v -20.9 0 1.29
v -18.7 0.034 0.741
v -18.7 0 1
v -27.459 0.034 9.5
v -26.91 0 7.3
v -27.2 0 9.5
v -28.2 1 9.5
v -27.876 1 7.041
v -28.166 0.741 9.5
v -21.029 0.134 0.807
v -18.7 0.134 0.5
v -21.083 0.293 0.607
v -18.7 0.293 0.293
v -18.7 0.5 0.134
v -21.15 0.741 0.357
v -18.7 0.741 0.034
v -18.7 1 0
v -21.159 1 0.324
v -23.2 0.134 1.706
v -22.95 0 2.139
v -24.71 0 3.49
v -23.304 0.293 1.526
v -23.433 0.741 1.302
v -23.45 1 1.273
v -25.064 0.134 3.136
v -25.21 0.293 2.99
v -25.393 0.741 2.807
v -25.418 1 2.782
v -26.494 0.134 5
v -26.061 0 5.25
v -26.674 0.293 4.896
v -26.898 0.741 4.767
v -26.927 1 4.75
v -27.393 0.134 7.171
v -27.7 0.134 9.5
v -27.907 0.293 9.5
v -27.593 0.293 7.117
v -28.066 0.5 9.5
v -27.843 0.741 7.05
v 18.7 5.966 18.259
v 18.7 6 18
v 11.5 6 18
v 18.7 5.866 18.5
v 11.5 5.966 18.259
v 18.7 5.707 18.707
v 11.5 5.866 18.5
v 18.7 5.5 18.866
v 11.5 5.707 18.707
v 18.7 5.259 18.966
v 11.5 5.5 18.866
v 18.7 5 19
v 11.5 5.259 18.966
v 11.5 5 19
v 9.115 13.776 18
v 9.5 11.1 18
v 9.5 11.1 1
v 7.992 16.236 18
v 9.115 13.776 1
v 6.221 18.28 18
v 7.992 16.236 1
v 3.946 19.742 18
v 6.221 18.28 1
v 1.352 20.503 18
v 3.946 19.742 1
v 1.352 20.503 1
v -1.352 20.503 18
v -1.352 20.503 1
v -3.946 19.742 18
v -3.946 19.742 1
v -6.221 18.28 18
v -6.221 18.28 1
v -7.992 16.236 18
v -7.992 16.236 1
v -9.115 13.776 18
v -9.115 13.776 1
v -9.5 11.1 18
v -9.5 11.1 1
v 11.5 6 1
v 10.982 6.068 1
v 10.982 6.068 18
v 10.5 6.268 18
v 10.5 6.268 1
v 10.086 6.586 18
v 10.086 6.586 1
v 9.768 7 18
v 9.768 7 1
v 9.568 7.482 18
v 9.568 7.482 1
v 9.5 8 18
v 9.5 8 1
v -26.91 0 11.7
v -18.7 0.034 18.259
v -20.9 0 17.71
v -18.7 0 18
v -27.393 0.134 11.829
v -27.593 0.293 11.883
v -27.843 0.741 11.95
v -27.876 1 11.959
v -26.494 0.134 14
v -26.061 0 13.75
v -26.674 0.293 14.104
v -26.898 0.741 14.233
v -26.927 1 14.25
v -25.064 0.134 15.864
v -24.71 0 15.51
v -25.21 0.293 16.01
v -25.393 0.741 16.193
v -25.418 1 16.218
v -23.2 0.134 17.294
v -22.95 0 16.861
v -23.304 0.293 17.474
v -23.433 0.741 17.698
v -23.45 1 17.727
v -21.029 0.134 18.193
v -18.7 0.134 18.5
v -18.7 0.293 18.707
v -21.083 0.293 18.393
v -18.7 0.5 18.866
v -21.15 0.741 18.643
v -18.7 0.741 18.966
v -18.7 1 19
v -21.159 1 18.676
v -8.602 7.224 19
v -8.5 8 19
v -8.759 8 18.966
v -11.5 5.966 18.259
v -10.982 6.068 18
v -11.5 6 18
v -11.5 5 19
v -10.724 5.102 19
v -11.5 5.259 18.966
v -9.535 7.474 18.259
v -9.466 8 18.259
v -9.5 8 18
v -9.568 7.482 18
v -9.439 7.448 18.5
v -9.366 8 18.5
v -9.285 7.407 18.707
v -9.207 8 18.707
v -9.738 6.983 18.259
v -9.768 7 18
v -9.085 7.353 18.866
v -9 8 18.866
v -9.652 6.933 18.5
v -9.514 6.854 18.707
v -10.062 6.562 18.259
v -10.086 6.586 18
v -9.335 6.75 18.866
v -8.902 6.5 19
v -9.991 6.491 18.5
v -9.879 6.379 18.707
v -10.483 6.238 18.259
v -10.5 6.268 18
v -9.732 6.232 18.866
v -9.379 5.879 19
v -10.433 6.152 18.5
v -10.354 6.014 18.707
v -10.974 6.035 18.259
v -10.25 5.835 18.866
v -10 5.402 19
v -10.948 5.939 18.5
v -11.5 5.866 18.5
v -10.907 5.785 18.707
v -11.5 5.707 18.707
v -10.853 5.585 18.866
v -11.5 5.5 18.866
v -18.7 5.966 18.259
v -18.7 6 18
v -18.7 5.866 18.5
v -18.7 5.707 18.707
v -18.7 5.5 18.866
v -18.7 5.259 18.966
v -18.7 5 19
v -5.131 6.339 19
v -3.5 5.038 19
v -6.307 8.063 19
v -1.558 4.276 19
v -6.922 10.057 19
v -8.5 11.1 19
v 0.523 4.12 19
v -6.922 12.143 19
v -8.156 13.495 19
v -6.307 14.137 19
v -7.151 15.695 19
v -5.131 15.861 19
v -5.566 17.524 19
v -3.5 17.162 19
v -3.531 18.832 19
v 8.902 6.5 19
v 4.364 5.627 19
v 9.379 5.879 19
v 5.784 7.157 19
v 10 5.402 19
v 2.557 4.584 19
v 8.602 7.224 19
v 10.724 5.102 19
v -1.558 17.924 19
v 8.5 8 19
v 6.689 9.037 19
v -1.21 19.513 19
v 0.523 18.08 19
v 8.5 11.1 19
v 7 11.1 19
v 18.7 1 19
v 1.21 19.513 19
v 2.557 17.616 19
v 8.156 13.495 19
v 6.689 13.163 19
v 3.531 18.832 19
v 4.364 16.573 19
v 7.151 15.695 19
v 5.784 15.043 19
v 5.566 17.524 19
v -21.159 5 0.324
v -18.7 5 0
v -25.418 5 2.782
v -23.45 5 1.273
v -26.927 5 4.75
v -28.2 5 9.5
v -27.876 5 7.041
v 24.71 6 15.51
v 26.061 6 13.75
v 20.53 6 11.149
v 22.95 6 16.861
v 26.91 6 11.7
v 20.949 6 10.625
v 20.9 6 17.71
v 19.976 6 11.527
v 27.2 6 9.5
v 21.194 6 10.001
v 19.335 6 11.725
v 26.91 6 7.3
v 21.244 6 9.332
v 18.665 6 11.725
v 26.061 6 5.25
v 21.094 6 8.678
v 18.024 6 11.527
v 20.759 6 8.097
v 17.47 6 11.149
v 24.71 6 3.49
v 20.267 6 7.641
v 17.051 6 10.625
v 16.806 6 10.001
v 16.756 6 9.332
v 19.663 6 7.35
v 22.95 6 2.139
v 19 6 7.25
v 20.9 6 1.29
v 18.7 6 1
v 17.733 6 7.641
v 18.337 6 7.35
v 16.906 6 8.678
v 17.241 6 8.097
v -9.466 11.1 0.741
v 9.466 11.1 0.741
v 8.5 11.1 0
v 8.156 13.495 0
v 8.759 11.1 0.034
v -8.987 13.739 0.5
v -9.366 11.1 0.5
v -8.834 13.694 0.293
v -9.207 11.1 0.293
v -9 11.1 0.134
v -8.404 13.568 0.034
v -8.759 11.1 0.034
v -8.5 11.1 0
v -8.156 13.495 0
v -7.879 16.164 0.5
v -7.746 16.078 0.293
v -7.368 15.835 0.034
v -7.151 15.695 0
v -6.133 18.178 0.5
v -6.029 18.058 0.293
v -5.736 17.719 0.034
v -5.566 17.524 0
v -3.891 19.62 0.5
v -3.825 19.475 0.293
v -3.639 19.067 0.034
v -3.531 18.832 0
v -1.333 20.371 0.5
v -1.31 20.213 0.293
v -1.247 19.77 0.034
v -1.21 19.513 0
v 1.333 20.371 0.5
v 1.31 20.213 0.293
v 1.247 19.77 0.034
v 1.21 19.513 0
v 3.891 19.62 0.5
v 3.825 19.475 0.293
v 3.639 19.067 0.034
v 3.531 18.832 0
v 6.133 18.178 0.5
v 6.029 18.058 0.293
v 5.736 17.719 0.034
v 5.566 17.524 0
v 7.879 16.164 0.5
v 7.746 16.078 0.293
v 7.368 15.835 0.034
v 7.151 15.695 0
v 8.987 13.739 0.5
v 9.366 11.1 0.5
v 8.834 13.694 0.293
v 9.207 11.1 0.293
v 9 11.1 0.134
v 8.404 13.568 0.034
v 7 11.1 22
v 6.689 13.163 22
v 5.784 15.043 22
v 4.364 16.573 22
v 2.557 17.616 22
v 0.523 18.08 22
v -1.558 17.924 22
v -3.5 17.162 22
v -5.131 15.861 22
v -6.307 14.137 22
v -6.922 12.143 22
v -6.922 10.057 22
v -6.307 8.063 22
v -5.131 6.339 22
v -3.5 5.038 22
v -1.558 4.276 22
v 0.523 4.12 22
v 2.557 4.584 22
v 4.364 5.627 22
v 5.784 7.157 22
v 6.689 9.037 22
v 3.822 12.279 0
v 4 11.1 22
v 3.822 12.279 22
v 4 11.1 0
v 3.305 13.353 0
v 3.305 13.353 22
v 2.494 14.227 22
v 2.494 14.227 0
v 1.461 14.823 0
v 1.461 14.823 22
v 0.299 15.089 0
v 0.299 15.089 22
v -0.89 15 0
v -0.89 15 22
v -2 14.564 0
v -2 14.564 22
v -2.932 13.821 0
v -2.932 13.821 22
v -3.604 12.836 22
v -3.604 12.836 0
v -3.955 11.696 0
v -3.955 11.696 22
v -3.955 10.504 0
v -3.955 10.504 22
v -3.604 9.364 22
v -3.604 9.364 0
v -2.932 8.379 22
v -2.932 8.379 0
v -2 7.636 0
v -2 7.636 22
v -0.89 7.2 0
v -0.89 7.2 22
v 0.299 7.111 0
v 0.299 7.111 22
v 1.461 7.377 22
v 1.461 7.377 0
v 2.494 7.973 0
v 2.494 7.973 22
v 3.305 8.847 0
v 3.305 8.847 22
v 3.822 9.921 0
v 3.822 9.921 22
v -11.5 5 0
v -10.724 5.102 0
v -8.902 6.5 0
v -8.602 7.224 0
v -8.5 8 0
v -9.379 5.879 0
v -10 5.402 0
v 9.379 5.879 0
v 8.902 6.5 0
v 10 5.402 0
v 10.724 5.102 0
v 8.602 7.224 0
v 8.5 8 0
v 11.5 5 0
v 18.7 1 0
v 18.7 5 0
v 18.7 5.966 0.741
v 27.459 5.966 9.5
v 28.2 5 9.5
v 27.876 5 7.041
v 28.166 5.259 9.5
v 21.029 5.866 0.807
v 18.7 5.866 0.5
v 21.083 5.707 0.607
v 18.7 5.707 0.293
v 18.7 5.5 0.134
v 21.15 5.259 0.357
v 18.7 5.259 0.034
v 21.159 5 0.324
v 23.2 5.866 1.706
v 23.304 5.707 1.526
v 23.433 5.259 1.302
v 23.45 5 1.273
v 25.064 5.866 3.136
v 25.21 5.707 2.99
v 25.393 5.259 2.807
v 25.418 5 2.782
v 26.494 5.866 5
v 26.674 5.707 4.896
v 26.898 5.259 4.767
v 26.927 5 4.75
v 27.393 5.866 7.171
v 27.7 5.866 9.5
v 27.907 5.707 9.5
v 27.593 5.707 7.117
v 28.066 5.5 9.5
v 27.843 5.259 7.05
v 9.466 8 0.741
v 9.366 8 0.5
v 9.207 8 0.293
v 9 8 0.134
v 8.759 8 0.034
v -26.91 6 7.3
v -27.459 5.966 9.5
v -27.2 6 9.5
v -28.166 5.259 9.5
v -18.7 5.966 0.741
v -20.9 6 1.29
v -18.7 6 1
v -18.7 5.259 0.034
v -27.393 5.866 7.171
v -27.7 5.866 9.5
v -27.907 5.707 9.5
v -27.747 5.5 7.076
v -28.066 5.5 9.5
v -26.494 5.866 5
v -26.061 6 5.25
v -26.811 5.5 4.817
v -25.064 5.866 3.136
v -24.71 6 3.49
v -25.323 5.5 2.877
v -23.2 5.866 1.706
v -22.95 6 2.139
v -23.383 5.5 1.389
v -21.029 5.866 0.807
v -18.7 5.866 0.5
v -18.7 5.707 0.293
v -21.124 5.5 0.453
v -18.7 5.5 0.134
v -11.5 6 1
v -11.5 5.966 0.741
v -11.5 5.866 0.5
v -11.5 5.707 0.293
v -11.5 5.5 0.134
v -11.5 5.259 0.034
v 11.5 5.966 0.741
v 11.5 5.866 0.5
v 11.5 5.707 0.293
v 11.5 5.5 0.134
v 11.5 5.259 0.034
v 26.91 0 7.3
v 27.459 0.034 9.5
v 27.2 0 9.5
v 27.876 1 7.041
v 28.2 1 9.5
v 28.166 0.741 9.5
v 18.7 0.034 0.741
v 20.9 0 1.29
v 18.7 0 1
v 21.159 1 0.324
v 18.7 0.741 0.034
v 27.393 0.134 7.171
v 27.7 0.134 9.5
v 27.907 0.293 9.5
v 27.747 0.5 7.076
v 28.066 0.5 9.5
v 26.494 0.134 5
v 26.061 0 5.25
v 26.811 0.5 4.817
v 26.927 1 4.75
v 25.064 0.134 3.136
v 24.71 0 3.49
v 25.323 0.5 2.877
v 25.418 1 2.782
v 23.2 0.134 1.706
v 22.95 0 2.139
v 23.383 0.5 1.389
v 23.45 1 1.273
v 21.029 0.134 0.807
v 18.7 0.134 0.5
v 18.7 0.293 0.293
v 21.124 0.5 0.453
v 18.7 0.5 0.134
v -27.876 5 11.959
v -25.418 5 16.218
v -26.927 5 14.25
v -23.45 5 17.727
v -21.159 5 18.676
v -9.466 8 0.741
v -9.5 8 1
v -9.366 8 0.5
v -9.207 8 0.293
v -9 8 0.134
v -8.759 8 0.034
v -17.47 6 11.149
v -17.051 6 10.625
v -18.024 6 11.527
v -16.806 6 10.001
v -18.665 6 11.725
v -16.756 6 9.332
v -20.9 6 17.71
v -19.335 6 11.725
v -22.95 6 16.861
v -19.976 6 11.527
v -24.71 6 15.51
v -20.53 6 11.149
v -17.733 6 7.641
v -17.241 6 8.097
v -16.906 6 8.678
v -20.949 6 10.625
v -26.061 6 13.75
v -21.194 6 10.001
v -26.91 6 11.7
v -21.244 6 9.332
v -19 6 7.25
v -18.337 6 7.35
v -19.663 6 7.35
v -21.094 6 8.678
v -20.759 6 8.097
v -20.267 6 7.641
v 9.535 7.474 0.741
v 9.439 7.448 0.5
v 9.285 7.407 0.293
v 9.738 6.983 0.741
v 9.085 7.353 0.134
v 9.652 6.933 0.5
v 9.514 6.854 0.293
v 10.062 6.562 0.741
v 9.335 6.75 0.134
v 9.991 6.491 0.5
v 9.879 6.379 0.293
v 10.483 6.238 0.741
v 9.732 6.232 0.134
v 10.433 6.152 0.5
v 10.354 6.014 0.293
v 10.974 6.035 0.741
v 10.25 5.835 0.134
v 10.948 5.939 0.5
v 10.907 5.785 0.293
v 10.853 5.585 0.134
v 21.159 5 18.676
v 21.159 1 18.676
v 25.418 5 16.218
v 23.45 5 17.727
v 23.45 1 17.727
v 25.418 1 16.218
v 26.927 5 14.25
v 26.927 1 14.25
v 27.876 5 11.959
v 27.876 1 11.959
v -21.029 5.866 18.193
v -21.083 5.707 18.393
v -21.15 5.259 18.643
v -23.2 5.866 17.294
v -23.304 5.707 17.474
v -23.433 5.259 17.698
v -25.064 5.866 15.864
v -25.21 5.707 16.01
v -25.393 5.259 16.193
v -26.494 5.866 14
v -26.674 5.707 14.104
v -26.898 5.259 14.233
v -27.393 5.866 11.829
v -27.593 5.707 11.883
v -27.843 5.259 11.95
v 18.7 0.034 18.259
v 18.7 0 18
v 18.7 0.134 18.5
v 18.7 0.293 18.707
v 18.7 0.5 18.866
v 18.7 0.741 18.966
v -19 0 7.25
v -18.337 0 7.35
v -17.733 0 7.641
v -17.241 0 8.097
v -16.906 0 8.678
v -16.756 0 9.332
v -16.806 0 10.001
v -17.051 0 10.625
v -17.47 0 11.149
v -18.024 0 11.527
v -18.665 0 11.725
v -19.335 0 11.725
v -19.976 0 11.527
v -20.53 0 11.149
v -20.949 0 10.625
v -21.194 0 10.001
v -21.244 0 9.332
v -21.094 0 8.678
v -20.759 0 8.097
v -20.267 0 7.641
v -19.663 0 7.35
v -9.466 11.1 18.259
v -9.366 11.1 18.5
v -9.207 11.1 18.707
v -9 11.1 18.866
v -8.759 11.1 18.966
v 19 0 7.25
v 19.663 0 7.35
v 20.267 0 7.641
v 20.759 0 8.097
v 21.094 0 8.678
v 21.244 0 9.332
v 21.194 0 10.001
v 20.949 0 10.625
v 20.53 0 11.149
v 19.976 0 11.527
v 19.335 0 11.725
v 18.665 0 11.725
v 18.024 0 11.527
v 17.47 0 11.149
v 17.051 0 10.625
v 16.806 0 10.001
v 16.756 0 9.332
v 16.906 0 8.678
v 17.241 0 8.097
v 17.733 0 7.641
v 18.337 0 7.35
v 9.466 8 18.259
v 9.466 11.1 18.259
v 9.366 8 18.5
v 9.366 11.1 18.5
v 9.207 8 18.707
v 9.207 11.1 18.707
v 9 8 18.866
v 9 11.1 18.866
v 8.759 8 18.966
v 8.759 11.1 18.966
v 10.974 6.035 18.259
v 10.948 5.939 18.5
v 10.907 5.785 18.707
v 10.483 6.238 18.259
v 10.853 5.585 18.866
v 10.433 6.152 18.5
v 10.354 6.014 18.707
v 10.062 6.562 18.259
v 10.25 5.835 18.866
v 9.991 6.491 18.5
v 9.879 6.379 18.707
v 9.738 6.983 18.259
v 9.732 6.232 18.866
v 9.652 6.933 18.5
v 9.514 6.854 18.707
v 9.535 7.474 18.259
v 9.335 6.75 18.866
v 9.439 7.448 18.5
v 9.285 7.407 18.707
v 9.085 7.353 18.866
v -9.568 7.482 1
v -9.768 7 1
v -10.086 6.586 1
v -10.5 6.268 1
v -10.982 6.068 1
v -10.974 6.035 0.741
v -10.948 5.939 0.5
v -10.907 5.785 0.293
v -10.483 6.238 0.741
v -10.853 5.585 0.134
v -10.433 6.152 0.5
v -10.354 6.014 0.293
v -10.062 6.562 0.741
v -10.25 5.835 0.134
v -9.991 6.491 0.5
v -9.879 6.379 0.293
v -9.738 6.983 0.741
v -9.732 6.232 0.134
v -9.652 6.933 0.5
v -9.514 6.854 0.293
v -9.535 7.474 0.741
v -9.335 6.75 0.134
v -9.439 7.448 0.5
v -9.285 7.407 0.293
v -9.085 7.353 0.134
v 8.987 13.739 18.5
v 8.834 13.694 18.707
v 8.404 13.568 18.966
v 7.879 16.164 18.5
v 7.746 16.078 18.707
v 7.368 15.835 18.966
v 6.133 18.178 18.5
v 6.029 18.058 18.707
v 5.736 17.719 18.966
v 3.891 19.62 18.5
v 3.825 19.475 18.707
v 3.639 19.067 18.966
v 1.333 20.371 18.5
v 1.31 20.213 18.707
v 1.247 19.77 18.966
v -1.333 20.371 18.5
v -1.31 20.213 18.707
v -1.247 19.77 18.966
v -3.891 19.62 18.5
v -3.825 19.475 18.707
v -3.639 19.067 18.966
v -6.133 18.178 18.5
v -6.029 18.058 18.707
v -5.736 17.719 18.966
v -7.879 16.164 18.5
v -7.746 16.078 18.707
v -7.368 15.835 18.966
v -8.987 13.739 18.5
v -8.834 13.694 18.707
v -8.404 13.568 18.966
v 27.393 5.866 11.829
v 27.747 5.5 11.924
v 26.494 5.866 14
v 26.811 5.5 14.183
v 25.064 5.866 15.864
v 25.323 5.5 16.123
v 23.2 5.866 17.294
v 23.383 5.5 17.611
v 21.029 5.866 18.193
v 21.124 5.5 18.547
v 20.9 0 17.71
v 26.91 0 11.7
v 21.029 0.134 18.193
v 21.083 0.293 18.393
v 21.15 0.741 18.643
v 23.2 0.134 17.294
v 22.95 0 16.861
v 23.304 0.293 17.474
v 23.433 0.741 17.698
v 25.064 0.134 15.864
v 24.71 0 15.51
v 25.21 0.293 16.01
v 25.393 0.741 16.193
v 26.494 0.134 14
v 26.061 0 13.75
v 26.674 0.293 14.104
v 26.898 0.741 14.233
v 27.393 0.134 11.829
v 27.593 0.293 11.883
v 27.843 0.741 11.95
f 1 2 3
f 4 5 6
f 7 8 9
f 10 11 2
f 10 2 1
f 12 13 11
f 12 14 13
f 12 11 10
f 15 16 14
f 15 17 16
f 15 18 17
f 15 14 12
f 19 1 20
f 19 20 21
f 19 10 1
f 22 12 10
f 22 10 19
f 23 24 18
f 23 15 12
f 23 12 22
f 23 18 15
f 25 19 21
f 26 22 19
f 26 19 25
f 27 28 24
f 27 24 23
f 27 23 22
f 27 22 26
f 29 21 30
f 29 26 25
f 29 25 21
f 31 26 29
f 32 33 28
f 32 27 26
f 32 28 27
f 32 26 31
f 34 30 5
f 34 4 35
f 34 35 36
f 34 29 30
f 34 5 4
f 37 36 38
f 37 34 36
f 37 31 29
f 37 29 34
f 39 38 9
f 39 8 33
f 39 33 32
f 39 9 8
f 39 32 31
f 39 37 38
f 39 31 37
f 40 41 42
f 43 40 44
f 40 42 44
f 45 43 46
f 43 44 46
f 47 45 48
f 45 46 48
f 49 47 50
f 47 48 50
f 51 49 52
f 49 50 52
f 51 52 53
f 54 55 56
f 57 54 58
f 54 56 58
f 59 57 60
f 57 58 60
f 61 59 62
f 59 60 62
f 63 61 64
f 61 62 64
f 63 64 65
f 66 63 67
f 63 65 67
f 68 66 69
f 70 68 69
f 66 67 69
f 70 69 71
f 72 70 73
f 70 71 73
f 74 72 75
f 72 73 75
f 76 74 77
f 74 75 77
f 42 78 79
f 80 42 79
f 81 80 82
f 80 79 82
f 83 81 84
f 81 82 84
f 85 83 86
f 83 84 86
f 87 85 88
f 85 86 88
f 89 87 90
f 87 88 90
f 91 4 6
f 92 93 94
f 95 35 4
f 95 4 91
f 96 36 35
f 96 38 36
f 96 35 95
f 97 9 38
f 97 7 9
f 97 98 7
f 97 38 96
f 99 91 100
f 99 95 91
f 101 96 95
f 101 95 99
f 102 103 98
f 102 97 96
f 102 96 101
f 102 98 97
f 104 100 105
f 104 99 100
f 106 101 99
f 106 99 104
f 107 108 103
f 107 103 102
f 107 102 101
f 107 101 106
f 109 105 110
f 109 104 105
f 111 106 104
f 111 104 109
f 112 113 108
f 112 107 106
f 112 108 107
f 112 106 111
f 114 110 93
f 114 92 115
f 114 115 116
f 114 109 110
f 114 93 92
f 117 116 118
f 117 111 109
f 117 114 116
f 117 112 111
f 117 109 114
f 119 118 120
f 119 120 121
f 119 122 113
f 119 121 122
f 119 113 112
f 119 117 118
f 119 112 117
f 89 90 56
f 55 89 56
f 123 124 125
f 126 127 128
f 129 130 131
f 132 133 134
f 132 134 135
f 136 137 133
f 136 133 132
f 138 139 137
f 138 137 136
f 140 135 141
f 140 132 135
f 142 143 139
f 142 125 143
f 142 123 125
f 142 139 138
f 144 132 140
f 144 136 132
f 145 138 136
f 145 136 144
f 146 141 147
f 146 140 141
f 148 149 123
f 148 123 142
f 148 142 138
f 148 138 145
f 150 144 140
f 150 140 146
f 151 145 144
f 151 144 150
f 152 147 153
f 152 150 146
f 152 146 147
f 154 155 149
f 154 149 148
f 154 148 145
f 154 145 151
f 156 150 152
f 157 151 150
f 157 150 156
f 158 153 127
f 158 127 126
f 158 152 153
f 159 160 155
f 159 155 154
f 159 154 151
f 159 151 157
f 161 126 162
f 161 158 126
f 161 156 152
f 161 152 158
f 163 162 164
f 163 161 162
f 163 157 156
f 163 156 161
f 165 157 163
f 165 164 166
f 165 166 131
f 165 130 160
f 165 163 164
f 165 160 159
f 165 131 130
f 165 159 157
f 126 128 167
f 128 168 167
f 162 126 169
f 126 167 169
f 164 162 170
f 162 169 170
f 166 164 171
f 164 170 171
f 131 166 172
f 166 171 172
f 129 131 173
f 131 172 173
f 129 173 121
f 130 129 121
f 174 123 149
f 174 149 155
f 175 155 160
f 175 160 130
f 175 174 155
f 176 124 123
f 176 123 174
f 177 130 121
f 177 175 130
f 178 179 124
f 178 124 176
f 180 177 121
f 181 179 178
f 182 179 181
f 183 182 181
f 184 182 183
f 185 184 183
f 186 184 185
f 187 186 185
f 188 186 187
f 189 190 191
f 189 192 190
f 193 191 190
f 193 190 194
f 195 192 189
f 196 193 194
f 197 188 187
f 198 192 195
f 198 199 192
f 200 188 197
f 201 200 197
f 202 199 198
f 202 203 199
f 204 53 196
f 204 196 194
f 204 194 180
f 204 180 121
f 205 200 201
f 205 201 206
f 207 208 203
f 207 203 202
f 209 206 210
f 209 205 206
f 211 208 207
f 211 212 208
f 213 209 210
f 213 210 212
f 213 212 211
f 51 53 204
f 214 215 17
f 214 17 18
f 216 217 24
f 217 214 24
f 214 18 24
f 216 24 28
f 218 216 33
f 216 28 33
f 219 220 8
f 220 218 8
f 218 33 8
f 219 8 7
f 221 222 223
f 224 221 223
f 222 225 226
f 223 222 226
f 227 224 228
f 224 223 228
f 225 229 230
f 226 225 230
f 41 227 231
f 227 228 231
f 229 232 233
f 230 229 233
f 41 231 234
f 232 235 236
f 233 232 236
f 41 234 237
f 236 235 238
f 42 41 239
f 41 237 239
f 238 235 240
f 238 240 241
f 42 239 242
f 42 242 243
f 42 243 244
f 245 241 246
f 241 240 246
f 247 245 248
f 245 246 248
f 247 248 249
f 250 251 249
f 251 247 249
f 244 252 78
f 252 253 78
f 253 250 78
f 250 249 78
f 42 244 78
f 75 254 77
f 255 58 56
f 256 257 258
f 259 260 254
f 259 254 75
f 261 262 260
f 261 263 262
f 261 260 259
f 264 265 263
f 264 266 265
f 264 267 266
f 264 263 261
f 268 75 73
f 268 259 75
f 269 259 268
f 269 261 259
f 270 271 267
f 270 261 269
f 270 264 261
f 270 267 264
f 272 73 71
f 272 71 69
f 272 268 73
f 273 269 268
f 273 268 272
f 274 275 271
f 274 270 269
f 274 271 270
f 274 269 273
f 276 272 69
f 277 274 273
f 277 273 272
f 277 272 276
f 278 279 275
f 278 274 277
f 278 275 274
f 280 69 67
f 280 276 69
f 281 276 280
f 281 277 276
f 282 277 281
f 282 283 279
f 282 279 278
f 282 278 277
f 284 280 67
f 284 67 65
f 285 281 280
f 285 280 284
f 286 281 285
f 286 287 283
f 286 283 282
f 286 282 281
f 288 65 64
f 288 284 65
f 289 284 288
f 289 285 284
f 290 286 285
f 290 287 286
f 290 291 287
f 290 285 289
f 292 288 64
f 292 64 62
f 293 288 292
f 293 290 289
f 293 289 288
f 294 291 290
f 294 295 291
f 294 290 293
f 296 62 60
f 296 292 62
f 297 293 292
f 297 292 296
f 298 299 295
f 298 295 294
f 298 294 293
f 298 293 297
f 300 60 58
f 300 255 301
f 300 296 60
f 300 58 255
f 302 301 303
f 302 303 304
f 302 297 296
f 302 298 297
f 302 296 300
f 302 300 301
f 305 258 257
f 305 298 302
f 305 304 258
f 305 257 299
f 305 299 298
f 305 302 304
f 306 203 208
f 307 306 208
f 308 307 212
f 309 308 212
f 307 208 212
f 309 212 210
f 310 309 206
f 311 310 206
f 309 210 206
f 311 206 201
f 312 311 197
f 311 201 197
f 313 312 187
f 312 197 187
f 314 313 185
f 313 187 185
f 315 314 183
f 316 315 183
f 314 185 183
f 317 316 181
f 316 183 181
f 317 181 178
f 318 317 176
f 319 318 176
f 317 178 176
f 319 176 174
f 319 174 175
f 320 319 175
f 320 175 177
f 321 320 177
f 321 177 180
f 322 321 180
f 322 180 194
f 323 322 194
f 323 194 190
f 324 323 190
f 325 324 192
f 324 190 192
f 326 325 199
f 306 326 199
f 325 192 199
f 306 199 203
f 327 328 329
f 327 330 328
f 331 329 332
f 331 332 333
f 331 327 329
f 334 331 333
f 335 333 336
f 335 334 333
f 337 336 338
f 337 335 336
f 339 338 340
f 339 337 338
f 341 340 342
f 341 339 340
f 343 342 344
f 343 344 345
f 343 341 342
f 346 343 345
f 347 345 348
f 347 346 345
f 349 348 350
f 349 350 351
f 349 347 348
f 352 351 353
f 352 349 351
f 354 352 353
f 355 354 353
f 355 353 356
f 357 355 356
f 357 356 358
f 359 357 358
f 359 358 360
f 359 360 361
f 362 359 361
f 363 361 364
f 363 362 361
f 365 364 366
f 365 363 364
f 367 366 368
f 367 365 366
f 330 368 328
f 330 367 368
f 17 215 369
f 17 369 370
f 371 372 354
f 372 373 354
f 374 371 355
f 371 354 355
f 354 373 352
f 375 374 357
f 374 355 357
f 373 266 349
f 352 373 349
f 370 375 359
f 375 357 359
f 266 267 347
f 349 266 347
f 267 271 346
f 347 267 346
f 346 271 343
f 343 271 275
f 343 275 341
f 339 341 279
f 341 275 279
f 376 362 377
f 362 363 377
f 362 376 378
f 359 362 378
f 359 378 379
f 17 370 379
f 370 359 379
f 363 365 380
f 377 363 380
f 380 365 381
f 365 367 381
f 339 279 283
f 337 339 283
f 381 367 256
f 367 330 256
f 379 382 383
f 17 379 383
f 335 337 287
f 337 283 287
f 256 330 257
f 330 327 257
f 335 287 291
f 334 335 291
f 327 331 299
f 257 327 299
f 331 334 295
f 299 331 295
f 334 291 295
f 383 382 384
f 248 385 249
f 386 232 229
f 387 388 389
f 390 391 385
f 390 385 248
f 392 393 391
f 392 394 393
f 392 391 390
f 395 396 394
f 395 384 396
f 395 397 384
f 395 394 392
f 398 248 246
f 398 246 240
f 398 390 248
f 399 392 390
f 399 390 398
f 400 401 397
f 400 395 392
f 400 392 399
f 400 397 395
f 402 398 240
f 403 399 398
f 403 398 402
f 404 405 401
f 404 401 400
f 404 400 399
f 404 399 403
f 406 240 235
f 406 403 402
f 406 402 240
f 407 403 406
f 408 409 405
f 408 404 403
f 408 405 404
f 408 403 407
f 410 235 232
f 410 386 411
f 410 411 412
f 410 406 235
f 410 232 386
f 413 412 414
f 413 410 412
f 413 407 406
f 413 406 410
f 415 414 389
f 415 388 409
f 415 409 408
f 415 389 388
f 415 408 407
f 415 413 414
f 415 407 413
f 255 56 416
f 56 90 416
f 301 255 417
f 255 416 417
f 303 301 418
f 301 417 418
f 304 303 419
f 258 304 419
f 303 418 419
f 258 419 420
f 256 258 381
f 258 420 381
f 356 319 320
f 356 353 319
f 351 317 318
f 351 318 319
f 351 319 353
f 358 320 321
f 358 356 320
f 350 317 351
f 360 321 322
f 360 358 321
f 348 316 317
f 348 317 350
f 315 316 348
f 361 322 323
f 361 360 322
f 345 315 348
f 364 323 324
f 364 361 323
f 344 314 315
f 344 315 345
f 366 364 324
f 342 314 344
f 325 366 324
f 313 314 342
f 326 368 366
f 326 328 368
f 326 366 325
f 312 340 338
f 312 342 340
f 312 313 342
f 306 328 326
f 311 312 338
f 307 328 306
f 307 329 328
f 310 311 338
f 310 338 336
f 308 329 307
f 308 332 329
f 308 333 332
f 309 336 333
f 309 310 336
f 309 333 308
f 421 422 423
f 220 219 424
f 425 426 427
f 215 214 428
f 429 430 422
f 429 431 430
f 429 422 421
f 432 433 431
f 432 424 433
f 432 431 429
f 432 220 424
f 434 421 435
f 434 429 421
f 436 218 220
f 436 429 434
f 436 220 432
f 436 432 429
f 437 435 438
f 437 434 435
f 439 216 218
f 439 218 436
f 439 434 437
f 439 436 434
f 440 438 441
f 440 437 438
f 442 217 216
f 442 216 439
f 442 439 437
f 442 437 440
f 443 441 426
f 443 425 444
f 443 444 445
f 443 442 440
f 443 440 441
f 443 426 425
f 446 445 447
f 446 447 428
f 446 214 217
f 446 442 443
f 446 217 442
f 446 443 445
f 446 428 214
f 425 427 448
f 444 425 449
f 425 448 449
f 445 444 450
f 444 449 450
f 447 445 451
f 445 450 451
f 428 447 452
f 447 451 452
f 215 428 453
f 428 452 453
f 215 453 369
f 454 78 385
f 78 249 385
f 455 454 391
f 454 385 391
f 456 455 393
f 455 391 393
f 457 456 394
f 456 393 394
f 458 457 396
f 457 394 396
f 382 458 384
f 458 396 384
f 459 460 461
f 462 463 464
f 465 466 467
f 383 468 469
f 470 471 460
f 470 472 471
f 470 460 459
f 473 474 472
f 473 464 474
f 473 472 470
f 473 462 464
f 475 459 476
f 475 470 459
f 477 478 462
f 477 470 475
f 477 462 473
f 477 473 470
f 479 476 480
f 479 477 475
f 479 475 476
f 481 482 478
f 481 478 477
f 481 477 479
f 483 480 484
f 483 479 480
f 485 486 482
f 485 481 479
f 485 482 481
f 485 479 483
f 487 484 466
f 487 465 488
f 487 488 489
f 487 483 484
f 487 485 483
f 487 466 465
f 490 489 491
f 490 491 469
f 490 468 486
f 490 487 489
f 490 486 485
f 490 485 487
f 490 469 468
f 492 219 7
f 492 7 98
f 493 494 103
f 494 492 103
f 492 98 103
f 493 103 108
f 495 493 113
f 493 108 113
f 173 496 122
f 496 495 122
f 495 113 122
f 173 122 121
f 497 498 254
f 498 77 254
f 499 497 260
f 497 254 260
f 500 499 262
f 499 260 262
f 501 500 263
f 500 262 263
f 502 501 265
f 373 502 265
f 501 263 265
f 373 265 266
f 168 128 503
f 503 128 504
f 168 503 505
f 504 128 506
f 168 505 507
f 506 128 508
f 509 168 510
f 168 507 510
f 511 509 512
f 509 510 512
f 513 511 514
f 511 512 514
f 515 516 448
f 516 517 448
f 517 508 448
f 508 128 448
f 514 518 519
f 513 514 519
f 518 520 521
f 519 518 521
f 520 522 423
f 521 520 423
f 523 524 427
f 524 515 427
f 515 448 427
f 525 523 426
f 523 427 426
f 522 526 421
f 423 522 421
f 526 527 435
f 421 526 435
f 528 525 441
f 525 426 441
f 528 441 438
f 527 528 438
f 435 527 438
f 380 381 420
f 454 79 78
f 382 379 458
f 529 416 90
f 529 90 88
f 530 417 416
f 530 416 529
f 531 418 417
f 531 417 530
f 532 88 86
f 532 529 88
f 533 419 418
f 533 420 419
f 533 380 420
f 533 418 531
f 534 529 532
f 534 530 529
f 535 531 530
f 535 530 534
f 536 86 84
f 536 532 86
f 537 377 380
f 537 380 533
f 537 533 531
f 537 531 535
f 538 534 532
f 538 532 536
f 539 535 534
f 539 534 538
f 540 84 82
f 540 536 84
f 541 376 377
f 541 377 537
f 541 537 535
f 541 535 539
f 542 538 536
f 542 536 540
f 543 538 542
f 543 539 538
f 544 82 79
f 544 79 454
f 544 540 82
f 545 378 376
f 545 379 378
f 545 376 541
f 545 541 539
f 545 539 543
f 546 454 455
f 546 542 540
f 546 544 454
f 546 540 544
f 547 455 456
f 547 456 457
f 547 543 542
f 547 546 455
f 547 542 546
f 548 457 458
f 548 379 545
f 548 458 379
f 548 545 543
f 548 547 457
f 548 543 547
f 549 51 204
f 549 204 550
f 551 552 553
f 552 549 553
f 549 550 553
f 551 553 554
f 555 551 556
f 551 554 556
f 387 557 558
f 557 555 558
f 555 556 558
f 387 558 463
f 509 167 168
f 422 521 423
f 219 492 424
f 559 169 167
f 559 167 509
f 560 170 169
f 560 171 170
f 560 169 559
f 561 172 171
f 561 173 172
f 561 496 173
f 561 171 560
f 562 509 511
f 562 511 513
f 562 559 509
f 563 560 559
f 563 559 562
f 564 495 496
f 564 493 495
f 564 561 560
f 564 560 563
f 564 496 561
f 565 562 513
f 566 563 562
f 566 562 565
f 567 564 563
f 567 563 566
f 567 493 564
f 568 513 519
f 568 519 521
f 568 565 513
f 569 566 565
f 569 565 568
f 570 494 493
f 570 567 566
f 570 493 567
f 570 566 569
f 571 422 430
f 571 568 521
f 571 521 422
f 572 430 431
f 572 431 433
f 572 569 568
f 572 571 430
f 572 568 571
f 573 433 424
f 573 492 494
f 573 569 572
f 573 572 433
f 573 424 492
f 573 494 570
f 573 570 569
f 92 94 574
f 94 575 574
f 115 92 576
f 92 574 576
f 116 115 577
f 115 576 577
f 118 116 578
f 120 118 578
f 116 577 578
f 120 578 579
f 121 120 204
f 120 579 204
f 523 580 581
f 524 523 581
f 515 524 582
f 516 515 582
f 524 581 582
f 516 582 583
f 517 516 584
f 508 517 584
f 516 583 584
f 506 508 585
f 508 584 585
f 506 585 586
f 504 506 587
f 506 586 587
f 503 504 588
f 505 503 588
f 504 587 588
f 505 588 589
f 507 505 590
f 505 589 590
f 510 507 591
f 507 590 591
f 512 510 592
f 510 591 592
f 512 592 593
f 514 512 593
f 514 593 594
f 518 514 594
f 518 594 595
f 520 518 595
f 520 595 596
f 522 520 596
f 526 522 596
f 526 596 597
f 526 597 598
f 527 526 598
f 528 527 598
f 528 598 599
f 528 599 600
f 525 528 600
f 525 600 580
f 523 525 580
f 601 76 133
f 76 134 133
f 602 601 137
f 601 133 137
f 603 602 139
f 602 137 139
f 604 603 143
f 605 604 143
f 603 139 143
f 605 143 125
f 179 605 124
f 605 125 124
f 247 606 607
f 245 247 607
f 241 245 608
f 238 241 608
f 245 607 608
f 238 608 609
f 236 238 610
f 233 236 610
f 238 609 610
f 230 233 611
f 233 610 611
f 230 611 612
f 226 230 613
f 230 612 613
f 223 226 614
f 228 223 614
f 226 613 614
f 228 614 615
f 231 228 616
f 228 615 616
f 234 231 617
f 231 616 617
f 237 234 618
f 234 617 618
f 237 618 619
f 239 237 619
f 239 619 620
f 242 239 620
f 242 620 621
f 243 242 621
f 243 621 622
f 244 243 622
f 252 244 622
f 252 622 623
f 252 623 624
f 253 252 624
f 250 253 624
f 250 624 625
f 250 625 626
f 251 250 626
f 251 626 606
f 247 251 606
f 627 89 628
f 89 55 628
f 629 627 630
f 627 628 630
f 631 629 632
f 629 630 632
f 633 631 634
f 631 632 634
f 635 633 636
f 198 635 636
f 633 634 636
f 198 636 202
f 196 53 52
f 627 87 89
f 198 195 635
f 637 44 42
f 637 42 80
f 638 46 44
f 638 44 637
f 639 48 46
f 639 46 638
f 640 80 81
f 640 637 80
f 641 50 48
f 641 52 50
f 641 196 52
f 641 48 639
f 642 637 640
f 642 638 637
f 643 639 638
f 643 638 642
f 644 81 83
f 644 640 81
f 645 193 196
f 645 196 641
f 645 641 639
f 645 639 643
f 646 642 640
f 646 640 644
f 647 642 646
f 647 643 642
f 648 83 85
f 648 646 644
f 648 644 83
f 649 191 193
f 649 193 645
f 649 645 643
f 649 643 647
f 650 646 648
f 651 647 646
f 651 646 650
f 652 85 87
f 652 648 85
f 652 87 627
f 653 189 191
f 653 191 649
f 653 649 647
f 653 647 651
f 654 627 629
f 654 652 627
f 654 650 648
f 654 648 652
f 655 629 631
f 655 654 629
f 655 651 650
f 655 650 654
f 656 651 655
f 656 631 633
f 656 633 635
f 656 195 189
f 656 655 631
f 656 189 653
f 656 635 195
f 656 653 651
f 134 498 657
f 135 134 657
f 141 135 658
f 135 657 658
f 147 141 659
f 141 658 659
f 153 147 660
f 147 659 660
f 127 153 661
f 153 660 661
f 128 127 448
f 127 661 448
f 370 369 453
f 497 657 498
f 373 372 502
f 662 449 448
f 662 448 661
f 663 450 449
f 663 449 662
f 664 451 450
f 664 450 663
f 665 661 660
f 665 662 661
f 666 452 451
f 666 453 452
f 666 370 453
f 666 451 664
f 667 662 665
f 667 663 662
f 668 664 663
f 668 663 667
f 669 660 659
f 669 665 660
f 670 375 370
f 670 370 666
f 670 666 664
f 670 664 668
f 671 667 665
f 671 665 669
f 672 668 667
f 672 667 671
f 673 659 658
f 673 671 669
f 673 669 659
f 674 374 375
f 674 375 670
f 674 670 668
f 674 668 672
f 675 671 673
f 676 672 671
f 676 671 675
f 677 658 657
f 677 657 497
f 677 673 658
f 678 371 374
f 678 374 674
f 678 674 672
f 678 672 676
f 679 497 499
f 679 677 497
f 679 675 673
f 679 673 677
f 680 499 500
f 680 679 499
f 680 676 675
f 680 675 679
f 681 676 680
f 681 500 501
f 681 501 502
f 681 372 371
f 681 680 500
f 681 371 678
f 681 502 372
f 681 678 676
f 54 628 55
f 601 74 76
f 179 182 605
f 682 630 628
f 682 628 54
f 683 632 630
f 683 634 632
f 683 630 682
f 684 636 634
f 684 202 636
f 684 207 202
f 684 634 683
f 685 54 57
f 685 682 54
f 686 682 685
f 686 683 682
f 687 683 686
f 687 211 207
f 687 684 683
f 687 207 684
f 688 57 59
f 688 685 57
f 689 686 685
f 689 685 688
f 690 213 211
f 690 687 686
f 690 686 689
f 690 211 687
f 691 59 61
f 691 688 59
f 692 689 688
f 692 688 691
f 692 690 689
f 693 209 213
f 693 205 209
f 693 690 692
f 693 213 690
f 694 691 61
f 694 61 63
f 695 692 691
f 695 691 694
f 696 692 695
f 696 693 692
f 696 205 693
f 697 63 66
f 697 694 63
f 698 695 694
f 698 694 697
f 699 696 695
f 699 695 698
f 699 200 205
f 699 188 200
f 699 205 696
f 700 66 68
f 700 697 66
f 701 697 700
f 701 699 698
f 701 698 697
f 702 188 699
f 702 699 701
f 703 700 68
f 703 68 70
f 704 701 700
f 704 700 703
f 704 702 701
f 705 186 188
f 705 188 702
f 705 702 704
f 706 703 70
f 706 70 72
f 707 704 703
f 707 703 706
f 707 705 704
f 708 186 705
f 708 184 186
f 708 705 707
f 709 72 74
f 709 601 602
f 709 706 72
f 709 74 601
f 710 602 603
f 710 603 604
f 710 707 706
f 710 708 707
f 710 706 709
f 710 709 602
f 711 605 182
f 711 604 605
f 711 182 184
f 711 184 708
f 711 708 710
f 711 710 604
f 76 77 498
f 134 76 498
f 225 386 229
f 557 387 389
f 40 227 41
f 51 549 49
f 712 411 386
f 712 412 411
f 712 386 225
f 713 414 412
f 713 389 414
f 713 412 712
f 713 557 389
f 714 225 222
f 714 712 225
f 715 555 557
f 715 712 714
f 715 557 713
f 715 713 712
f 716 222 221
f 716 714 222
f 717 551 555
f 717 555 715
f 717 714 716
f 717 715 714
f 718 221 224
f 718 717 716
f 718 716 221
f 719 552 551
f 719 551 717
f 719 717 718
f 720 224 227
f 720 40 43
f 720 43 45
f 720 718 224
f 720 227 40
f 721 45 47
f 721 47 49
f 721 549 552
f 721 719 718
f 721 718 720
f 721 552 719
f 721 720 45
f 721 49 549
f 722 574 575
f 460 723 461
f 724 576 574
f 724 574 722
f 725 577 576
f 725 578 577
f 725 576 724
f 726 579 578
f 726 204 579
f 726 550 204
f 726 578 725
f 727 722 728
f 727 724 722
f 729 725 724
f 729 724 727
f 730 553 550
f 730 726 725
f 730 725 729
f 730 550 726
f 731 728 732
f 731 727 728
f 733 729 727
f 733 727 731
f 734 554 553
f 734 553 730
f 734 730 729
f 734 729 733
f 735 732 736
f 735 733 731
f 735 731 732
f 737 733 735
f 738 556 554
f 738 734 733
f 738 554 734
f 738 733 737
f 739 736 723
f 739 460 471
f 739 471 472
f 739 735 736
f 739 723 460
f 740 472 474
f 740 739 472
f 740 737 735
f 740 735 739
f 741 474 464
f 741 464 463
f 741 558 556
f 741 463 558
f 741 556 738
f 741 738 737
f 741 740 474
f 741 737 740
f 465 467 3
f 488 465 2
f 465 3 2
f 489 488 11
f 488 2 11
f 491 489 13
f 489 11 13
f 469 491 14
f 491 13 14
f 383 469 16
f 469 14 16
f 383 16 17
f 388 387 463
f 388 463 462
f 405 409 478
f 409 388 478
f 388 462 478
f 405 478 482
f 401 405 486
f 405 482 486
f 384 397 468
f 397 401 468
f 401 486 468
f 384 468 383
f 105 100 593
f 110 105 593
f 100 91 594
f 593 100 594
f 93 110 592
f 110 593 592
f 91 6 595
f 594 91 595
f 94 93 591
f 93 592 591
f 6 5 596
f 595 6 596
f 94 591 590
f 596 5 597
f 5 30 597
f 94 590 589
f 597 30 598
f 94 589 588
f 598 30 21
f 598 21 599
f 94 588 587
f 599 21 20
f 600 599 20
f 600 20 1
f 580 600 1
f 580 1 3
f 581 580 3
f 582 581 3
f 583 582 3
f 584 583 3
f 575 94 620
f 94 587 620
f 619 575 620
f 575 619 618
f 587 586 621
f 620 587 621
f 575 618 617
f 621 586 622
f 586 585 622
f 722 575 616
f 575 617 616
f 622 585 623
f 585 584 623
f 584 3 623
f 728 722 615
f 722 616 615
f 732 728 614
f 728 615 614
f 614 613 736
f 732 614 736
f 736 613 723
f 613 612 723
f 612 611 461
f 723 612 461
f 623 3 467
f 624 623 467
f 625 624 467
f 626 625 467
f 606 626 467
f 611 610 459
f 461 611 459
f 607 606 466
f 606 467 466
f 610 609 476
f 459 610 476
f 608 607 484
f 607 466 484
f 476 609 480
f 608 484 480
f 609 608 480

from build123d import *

# Parameters (mm, degrees)
SKETCH1_R           = 4
BOSS_EXTRUDE1_DEPTH = 19
SKETCH2_R           = 2.25
CUT_EXTRUDE2_DEPTH  = 19
SKETCH3_R           = 7
SKETCH3_R_2         = 4
BOSS_EXTRUDE2_DEPTH = 3
FILLET1_R           = 1


with BuildPart() as part:
    # Sketch1 → Boss-Extrude1 (new body)
    with BuildSketch(Plane.XY):
        with BuildLine():
            Line((-28.2, 0), (28.2, 0))
            Line((28.2, 0), (28.2, 6))
            Line((28.2, 6), (11.5, 6))
            ThreePointArc((11.5, 6), (10.085786438, 6.585786438), (9.5, 8))
            Line((9.5, 8), (9.5, 11.1))
            ThreePointArc((9.5, 11.1), (0, 20.6), (-9.5, 11.1))
            Line((-9.5, 11.1), (-9.5, 8))
            ThreePointArc((-9.5, 8), (-10.085786438, 6.585786438), (-11.5, 6))
            Line((-11.5, 6), (-28.2, 6))
            Line((-28.2, 6), (-28.2, 0))
        make_face()
        with Locations((0, 11.1)):
            Circle(SKETCH1_R, mode=Mode.SUBTRACT)
    extrude(amount=BOSS_EXTRUDE1_DEPTH)

    # Sketch2 → Cut-Extrude2 (cut)
    with BuildSketch(Plane.XZ):
        with BuildLine():
            Line((28.2, 19), (18.7, 19))
            ThreePointArc((18.7, 19), (25.417514421, 16.217514421), (28.2, 9.5))
            Line((28.2, 9.5), (28.2, 19))
        make_face()
        with BuildLine():
            ThreePointArc((-28.2, 9.5), (-25.417514421, 16.217514421), (-18.7, 19))
            Line((-18.7, 19), (-28.2, 19))
            Line((-28.2, 19), (-28.2, 9.5))
        make_face()
        with BuildLine():
            Line((28.2, 0), (28.2, 9.5))
            ThreePointArc((28.2, 9.5), (25.417514421, 2.782485579), (18.7, 0))
            Line((18.7, 0), (28.2, 0))
        make_face()
        with BuildLine():
            ThreePointArc((-18.7, 0), (-25.417514421, 2.782485579), (-28.2, 9.5))
            Line((-28.2, 9.5), (-28.2, 0))
            Line((-28.2, 0), (-18.7, 0))
        make_face()
        with Locations(Location((19, 9.5, 0), (0, 0, 270))):
            Circle(SKETCH2_R)
        with Locations(Location((-19, 9.5, 0), (0, 0, 270))):
            Circle(SKETCH2_R)
    extrude(amount=-CUT_EXTRUDE2_DEPTH, mode=Mode.SUBTRACT)

    # Sketch3 → Boss-Extrude2 (add)
    with BuildSketch(Plane.XY.offset(19)):
        with Locations((0, 11.1)):
            Circle(SKETCH3_R)
        with Locations((0, 11.1)):
            Circle(SKETCH3_R_2, mode=Mode.SUBTRACT)
    extrude(amount=BOSS_EXTRUDE2_DEPTH)

    # Fillet1
    fillet1_edges = [part.edges().sort_by_distance(p)[0] for p in [
        (10.085786438, 6.585786438, 19),
        (-15.1, 6, 0),
        (-10.085786438, 6.585786438, 0),
        (-9.5, 9.55, 0),
        (0, 20.6, 0),
        (9.5, 9.55, 0),
        (10.085786438, 6.585786438, 0),
        (9.5, 9.55, 19),
        (0, 20.6, 19),
        (-9.5, 9.55, 19),
        (-10.085786438, 6.585786438, 19),
        (-15.1, 6, 19),
        (0, 0, 19),
        (-28.2, 6, 9.5),
        (-28.2, 0, 9.5),
        (0, 0, 0),
        (15.1, 6, 19),
        (28.2, 0, 9.5),
        (28.2, 6, 9.5),
        (15.1, 6, 0),
    ]]
    fillet(fillet1_edges, radius=FILLET1_R)


solid = part.part
